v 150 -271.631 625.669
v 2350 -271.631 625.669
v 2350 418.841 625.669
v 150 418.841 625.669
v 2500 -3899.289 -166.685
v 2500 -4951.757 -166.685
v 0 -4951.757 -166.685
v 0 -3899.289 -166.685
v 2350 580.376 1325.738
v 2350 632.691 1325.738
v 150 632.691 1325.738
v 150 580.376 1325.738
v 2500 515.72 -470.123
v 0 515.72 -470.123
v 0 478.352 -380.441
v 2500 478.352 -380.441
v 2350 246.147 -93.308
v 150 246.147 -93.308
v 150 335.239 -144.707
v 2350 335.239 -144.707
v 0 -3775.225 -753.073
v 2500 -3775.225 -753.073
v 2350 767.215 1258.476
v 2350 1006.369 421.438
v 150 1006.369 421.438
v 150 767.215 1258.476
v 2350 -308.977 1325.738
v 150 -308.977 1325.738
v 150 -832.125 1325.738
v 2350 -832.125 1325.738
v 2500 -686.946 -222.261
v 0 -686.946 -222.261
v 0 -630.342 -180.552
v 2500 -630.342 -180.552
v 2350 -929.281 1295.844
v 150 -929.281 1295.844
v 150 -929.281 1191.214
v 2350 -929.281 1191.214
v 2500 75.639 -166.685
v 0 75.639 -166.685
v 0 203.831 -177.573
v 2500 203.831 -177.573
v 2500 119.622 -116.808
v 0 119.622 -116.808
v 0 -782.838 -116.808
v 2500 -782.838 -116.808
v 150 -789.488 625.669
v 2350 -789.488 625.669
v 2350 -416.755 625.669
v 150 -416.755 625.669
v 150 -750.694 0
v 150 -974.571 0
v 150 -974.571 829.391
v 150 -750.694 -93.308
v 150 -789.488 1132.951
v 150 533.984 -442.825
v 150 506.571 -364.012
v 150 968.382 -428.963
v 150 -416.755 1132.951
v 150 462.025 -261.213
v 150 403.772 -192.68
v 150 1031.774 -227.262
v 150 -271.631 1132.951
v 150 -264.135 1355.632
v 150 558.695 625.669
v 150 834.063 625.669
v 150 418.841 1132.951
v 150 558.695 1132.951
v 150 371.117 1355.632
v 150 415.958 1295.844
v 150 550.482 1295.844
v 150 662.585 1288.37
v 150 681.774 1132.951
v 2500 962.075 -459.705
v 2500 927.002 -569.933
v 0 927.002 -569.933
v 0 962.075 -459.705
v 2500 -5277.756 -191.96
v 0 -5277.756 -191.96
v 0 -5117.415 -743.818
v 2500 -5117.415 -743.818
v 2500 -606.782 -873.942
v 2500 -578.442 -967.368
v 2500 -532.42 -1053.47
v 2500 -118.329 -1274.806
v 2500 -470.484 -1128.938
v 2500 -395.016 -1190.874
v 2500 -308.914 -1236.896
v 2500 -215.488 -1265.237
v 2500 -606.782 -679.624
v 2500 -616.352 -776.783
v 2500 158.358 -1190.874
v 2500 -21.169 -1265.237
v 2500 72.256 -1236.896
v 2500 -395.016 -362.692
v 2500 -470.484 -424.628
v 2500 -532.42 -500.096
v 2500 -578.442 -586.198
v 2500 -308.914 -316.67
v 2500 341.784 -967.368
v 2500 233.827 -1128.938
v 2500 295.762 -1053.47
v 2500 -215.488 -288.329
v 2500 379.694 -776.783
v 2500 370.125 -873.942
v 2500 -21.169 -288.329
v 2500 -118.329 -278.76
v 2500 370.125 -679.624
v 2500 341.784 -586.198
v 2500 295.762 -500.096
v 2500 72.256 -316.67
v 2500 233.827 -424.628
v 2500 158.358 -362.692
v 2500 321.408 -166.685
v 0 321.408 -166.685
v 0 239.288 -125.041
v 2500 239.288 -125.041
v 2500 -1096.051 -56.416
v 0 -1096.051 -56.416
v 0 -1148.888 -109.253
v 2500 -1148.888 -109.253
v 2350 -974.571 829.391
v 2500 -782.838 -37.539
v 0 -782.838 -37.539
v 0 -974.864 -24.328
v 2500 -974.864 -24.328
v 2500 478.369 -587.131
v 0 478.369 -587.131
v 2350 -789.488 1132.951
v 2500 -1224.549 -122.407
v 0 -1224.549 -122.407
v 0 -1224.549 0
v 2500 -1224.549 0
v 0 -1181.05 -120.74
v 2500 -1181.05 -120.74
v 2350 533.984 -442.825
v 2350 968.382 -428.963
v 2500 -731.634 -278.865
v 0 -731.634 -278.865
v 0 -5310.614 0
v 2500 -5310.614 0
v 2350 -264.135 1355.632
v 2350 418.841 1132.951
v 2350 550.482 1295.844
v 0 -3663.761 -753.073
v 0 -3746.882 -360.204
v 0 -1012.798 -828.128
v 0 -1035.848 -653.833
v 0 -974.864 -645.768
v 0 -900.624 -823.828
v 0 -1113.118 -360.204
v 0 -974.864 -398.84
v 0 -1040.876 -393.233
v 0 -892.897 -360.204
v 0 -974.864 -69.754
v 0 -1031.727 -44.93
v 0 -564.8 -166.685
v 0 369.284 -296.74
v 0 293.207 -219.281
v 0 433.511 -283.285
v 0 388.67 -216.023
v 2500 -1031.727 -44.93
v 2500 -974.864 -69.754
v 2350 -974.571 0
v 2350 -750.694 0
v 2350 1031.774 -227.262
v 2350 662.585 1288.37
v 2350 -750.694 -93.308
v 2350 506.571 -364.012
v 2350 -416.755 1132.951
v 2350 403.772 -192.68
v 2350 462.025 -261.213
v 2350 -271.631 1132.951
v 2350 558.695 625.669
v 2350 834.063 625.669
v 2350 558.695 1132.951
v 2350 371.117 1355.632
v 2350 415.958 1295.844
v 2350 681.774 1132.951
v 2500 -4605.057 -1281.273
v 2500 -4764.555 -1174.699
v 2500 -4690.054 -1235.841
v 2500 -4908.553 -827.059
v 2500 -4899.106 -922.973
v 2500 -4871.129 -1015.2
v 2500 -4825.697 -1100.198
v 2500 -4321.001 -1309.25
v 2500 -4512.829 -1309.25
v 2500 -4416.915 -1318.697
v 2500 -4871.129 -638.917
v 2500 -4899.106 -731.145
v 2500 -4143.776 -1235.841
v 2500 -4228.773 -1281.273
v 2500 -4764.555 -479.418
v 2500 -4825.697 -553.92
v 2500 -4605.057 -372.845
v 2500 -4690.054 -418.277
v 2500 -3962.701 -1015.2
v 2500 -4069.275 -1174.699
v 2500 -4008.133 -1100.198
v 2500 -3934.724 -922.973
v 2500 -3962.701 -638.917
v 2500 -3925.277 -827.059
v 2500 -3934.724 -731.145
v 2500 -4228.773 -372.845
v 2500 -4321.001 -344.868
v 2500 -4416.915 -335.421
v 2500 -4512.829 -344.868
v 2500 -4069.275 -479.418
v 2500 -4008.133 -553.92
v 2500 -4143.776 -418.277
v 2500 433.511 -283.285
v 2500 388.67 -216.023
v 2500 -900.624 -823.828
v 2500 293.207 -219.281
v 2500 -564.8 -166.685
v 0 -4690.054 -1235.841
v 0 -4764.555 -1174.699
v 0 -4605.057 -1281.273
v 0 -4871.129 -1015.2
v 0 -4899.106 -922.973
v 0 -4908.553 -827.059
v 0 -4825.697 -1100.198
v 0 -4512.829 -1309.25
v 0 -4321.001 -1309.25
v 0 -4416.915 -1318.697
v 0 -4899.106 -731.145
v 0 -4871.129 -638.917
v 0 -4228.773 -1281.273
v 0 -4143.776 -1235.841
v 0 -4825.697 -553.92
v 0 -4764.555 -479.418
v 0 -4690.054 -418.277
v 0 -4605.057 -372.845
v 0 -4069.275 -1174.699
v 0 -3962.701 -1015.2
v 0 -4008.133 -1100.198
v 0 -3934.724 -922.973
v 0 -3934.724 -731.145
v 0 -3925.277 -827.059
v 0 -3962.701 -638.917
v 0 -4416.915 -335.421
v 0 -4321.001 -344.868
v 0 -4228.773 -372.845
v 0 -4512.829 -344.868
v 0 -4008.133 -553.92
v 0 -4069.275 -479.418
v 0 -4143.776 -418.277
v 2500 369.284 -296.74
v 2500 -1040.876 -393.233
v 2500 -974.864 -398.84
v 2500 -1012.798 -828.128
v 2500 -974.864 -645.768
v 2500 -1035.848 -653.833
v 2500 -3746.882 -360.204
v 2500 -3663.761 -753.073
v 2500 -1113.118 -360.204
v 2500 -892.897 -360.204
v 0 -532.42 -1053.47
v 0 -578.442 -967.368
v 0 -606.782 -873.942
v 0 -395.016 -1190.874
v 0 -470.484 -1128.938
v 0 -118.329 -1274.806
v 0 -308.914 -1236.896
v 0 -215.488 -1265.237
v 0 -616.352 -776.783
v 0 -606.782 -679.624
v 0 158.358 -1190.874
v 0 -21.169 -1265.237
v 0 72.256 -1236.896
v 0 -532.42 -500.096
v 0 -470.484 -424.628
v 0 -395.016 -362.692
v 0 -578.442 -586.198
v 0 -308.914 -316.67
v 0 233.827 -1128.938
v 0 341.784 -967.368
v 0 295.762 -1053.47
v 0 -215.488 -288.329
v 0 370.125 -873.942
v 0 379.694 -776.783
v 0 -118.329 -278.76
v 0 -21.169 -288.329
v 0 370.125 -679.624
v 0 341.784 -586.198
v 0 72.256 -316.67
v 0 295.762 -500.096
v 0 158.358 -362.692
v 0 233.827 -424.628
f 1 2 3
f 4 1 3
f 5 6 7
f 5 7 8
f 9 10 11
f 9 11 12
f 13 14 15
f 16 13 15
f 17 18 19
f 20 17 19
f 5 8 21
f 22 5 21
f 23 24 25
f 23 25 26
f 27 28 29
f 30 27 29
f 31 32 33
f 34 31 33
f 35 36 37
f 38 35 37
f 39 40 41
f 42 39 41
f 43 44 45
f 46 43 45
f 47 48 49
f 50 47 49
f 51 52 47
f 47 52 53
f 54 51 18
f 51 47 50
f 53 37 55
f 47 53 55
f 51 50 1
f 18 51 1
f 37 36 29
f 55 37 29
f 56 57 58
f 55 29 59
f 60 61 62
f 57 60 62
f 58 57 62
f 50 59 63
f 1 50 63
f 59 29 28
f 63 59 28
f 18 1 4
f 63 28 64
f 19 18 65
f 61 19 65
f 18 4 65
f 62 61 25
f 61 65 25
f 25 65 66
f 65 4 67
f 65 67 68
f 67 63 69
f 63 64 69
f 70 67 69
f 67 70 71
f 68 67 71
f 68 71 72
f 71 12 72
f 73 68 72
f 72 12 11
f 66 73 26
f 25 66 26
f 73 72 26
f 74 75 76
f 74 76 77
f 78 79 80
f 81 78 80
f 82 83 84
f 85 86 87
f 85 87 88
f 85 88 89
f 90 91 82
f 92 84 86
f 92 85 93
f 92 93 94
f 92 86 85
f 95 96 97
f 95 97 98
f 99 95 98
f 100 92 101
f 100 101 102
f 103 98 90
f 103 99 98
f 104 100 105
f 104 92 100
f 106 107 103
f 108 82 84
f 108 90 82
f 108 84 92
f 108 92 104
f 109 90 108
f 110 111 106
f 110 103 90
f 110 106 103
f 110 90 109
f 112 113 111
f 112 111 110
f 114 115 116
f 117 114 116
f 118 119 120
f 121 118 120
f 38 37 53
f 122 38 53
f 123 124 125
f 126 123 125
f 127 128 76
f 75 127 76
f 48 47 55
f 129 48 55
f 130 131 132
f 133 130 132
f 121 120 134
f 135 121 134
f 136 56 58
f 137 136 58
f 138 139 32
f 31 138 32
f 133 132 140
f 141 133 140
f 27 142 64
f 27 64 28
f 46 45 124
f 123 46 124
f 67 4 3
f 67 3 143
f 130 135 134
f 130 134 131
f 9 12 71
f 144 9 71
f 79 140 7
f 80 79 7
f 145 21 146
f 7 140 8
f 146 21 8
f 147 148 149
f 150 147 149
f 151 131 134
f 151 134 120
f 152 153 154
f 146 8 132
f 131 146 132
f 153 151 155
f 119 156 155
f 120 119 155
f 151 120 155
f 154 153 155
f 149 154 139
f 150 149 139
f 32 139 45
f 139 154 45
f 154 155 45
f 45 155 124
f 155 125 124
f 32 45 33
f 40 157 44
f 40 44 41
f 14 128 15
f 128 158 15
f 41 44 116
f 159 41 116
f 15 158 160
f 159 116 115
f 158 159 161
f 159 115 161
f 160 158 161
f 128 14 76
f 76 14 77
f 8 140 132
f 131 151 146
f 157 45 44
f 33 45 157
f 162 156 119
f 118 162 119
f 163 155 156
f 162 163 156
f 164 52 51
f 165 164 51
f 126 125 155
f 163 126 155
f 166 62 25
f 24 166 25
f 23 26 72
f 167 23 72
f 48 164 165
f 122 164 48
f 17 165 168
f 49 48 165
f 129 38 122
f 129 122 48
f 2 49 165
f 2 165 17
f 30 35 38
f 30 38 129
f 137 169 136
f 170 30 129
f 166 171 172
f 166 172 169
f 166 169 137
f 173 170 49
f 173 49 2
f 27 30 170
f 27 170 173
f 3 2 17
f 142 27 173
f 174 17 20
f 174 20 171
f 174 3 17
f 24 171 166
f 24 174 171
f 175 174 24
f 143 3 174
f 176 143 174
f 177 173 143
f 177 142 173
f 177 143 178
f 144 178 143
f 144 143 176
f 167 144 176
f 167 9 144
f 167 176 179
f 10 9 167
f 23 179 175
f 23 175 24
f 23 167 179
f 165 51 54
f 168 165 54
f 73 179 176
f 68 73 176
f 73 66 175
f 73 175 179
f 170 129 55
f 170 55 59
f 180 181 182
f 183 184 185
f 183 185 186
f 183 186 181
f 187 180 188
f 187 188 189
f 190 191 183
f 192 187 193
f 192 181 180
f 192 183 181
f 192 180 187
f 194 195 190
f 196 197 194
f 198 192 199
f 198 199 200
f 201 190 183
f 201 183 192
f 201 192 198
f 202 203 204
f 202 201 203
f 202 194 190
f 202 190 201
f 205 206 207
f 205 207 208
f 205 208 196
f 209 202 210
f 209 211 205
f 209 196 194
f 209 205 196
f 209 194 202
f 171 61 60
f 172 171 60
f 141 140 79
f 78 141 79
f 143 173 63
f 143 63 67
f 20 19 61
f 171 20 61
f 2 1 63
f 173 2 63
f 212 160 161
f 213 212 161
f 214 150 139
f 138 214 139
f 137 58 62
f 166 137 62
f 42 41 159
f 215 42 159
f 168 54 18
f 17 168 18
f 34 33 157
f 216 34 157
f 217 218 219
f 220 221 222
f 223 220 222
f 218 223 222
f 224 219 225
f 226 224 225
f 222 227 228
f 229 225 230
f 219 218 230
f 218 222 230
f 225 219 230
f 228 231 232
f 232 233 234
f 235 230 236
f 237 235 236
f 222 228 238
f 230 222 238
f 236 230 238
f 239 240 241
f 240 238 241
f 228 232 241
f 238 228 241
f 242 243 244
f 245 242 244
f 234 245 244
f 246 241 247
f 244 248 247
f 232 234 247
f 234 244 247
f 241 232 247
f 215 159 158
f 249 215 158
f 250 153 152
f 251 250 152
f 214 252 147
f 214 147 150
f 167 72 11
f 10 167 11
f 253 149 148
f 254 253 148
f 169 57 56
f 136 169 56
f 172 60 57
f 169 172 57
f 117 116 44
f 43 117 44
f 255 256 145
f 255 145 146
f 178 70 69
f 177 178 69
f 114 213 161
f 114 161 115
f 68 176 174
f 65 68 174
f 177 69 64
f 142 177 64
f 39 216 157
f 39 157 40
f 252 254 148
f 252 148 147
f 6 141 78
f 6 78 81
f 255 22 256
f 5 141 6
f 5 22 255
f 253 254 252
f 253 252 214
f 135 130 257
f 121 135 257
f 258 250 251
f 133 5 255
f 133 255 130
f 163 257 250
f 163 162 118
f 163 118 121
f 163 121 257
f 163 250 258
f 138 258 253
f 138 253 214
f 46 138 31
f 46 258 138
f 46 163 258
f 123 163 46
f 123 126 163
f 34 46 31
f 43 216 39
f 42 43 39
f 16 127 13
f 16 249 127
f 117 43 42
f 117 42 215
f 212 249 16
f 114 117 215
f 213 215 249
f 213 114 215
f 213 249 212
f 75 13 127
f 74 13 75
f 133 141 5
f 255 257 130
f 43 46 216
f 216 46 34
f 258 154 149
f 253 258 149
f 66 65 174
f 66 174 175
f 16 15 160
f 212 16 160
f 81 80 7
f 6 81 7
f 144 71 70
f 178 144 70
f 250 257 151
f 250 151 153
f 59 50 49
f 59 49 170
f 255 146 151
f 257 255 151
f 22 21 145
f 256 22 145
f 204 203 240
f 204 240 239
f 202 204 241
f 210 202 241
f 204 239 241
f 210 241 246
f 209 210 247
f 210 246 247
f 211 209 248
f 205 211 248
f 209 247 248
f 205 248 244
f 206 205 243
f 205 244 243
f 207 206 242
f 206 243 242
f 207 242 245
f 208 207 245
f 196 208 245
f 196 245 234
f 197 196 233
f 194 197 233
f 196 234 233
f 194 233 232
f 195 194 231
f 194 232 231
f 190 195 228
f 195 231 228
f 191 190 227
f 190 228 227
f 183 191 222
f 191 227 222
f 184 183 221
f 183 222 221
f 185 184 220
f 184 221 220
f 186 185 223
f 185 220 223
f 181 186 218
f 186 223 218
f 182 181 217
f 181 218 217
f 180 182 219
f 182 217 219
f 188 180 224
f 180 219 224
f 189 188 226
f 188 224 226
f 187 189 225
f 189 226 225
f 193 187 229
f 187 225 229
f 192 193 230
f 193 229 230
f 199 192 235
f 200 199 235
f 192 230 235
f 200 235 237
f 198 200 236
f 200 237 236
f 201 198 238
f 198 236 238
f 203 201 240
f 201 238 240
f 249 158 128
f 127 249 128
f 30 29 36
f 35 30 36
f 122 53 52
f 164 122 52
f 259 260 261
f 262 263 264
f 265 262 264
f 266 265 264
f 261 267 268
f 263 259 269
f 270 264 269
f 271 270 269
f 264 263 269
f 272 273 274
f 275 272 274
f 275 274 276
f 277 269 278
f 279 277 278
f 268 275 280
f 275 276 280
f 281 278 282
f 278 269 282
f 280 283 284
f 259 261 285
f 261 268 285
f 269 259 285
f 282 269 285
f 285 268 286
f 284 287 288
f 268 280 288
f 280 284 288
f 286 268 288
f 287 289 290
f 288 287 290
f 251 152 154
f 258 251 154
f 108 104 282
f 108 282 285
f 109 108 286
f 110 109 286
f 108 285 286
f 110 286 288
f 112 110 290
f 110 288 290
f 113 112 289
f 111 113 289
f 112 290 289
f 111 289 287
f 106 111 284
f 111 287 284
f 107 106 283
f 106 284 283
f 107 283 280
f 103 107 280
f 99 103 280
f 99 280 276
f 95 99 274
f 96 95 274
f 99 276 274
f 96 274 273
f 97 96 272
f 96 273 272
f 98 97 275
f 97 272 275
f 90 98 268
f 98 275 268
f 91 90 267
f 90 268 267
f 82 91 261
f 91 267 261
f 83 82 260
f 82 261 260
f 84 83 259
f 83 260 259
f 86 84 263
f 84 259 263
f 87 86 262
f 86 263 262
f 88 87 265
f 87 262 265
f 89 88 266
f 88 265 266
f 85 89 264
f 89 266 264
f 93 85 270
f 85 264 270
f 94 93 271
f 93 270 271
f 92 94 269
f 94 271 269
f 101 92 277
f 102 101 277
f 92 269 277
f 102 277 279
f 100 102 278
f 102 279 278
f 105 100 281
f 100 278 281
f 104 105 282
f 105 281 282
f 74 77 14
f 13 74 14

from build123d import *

# Parameters (mm, degrees)
F3_DEPTH = 2500
F4_DEPTH = 2500
F1_R     = 491.6377645467
F5_DEPTH = 2500
F1_R_2   = 498.02299798
F6_W     = 372.7331161499
F6_H     = 507.2819590569
F6_W_2   = 690.471470356
F7_DEPTH = 2500
F8_DEPTH = 150
F9_DEPTH = 150


with BuildPart() as f3:
    # F0 (on Right) → F3 (new body)
    with BuildSketch(Plane.YZ):
        Polygon((-1224.5485678222, 0), (-5310.6136322021, 0), (-5277.7557373047, -191.9602900744), (-5117.4148913408, -743.8182594957), (-4951.7569541931, -166.6848343797), (-3899.2894684027, -166.6848343797), (-3775.2246856689, -753.0728117307), (-3663.7607209599, -753.0728117307), (-3746.8817234039, -360.2042198181), (-1113.1182909012, -360.2042198181), (-1040.8757674439, -393.2328965524), (-974.8640060425, -398.839533329), (-892.8970694542, -360.2042198181), (-974.8640060425, -645.7677109129), (-1035.8477830887, -653.8325548172), (-1012.7979517511, -828.128026859), (-900.6241559982, -823.8279223442), (-731.6343188286, -278.8651585579), (-686.946451664, -222.2605645657), (-630.3418874741, -180.5519014597), (-564.7996664047, -166.6848343797), (75.6386753714, -166.6848343797), (203.8312107325, -177.5727272034), (293.2069003582, -219.2813754082), (369.2835271358, -296.7402935028), (478.3685519201, -587.1312394465), (927.0023107529, -569.9331760406), (962.0749950409, -459.7048163414), (515.7201886177, -470.1234698296), (478.3523380756, -380.440890789), (433.5111379623, -283.2847237587), (388.6697292328, -216.0227298737), (321.4078247547, -166.6848343797), (239.2881385455, -125.041227132), (119.6218878031, -116.8081387877), (-782.8375101089, -116.8081387877), (-782.8375101089, -37.5391505659), (-974.8640060425, -24.3276469409), (-974.8640060425, -69.7538033128), (-1031.7270755768, -44.9297651649), (-1096.050620079, -56.4161129296), (-1148.8877534866, -109.2533096671), (-1181.0495853424, -120.7396537066), (-1224.5485678222, -122.4071569741), align=None)
    extrude(amount=F3_DEPTH)


with BuildPart() as f4:
    # F2 (on face) → F4 (new body)
    with BuildSketch(Plane.YZ):
        Polygon((-974.5712280273, 829.3906450272), (-974.5712280273, 0), (-750.6937384605, 0), (-750.6937384605, -93.3078676462), (119.3610876799, -93.3078676462), (246.1467087269, -93.3078676462), (335.2393209934, -144.70744133), (403.7721157074, -192.680388689), (462.0249569416, -261.2131536007), (506.5712332726, -364.0123307705), (533.9843630791, -442.8250193596), (968.382358551, -428.9629757404), (1031.7741632462, -227.2615879774), (1006.368637085, 421.4380383492), (767.2148942947, 1258.4758996964), (662.5851988792, 1288.370013237), (632.6910257339, 1325.7378339767), (580.3761482239, 1325.7378339767), (550.4819154739, 1295.8436012268), (415.9579873085, 1295.8436012268), (371.1166679859, 1355.6319475174), (-264.1352415085, 1355.6319475174), (-308.9765608311, 1325.7378339767), (-832.1251273155, 1325.7378339767), (-929.2812943459, 1295.8436012268), (-929.2812943459, 1191.213965416), align=None)
    extrude(amount=F4_DEPTH)

    # F6 (on face) → F7 (cut, through all)
    with BuildSketch(Plane.YZ.offset(2500)):
        with Locations((-603.1215190887, 879.3097436428)):
            Rectangle(F6_W, F6_H)
        with Locations((73.6051499844, 879.3097436428)):
            Rectangle(F6_W_2, F6_H)
        Polygon((681.7742115496, 1132.9507231712), (558.6945289137, 1132.9507231712), (558.6945289137, 625.6687641144), (834.063184881, 625.6687641144), align=None)
    extrude(amount=-F7_DEPTH, mode=Mode.SUBTRACT)

    # F8 (cut): a face of the model
    f8_faces = [f4.faces().sort_by_distance(p)[0] for p in [
        (2500, 59.5307734223, 448.7734529522),
    ]]
    extrude(f8_faces, amount=-F8_DEPTH, mode=Mode.SUBTRACT)

    # F9 (cut): a face of the model
    f9_faces = [f4.faces().sort_by_distance(p)[0] for p in [
        (0, 59.5307734223, 448.7734529522),
    ]]
    extrude(f9_faces, amount=-F9_DEPTH, mode=Mode.SUBTRACT)


with BuildPart() as f5:
    # F1 (on face) → F5 (new body)
    with BuildSketch(Plane.YZ):
        with Locations((-4416.9149398804, -827.0588517189)):
            Circle(F1_R)
    extrude(amount=F5_DEPTH)


with BuildPart() as f5b:
    # F1 (on face) → F5, piece 2 (new body)
    with BuildSketch(Plane.YZ):
        with Locations((-118.3288097382, -776.782989502)):
            Circle(F1_R_2)
    extrude(amount=F5_DEPTH)


solid = Compound([f3.part, f4.part, f5.part, f5b.part])
